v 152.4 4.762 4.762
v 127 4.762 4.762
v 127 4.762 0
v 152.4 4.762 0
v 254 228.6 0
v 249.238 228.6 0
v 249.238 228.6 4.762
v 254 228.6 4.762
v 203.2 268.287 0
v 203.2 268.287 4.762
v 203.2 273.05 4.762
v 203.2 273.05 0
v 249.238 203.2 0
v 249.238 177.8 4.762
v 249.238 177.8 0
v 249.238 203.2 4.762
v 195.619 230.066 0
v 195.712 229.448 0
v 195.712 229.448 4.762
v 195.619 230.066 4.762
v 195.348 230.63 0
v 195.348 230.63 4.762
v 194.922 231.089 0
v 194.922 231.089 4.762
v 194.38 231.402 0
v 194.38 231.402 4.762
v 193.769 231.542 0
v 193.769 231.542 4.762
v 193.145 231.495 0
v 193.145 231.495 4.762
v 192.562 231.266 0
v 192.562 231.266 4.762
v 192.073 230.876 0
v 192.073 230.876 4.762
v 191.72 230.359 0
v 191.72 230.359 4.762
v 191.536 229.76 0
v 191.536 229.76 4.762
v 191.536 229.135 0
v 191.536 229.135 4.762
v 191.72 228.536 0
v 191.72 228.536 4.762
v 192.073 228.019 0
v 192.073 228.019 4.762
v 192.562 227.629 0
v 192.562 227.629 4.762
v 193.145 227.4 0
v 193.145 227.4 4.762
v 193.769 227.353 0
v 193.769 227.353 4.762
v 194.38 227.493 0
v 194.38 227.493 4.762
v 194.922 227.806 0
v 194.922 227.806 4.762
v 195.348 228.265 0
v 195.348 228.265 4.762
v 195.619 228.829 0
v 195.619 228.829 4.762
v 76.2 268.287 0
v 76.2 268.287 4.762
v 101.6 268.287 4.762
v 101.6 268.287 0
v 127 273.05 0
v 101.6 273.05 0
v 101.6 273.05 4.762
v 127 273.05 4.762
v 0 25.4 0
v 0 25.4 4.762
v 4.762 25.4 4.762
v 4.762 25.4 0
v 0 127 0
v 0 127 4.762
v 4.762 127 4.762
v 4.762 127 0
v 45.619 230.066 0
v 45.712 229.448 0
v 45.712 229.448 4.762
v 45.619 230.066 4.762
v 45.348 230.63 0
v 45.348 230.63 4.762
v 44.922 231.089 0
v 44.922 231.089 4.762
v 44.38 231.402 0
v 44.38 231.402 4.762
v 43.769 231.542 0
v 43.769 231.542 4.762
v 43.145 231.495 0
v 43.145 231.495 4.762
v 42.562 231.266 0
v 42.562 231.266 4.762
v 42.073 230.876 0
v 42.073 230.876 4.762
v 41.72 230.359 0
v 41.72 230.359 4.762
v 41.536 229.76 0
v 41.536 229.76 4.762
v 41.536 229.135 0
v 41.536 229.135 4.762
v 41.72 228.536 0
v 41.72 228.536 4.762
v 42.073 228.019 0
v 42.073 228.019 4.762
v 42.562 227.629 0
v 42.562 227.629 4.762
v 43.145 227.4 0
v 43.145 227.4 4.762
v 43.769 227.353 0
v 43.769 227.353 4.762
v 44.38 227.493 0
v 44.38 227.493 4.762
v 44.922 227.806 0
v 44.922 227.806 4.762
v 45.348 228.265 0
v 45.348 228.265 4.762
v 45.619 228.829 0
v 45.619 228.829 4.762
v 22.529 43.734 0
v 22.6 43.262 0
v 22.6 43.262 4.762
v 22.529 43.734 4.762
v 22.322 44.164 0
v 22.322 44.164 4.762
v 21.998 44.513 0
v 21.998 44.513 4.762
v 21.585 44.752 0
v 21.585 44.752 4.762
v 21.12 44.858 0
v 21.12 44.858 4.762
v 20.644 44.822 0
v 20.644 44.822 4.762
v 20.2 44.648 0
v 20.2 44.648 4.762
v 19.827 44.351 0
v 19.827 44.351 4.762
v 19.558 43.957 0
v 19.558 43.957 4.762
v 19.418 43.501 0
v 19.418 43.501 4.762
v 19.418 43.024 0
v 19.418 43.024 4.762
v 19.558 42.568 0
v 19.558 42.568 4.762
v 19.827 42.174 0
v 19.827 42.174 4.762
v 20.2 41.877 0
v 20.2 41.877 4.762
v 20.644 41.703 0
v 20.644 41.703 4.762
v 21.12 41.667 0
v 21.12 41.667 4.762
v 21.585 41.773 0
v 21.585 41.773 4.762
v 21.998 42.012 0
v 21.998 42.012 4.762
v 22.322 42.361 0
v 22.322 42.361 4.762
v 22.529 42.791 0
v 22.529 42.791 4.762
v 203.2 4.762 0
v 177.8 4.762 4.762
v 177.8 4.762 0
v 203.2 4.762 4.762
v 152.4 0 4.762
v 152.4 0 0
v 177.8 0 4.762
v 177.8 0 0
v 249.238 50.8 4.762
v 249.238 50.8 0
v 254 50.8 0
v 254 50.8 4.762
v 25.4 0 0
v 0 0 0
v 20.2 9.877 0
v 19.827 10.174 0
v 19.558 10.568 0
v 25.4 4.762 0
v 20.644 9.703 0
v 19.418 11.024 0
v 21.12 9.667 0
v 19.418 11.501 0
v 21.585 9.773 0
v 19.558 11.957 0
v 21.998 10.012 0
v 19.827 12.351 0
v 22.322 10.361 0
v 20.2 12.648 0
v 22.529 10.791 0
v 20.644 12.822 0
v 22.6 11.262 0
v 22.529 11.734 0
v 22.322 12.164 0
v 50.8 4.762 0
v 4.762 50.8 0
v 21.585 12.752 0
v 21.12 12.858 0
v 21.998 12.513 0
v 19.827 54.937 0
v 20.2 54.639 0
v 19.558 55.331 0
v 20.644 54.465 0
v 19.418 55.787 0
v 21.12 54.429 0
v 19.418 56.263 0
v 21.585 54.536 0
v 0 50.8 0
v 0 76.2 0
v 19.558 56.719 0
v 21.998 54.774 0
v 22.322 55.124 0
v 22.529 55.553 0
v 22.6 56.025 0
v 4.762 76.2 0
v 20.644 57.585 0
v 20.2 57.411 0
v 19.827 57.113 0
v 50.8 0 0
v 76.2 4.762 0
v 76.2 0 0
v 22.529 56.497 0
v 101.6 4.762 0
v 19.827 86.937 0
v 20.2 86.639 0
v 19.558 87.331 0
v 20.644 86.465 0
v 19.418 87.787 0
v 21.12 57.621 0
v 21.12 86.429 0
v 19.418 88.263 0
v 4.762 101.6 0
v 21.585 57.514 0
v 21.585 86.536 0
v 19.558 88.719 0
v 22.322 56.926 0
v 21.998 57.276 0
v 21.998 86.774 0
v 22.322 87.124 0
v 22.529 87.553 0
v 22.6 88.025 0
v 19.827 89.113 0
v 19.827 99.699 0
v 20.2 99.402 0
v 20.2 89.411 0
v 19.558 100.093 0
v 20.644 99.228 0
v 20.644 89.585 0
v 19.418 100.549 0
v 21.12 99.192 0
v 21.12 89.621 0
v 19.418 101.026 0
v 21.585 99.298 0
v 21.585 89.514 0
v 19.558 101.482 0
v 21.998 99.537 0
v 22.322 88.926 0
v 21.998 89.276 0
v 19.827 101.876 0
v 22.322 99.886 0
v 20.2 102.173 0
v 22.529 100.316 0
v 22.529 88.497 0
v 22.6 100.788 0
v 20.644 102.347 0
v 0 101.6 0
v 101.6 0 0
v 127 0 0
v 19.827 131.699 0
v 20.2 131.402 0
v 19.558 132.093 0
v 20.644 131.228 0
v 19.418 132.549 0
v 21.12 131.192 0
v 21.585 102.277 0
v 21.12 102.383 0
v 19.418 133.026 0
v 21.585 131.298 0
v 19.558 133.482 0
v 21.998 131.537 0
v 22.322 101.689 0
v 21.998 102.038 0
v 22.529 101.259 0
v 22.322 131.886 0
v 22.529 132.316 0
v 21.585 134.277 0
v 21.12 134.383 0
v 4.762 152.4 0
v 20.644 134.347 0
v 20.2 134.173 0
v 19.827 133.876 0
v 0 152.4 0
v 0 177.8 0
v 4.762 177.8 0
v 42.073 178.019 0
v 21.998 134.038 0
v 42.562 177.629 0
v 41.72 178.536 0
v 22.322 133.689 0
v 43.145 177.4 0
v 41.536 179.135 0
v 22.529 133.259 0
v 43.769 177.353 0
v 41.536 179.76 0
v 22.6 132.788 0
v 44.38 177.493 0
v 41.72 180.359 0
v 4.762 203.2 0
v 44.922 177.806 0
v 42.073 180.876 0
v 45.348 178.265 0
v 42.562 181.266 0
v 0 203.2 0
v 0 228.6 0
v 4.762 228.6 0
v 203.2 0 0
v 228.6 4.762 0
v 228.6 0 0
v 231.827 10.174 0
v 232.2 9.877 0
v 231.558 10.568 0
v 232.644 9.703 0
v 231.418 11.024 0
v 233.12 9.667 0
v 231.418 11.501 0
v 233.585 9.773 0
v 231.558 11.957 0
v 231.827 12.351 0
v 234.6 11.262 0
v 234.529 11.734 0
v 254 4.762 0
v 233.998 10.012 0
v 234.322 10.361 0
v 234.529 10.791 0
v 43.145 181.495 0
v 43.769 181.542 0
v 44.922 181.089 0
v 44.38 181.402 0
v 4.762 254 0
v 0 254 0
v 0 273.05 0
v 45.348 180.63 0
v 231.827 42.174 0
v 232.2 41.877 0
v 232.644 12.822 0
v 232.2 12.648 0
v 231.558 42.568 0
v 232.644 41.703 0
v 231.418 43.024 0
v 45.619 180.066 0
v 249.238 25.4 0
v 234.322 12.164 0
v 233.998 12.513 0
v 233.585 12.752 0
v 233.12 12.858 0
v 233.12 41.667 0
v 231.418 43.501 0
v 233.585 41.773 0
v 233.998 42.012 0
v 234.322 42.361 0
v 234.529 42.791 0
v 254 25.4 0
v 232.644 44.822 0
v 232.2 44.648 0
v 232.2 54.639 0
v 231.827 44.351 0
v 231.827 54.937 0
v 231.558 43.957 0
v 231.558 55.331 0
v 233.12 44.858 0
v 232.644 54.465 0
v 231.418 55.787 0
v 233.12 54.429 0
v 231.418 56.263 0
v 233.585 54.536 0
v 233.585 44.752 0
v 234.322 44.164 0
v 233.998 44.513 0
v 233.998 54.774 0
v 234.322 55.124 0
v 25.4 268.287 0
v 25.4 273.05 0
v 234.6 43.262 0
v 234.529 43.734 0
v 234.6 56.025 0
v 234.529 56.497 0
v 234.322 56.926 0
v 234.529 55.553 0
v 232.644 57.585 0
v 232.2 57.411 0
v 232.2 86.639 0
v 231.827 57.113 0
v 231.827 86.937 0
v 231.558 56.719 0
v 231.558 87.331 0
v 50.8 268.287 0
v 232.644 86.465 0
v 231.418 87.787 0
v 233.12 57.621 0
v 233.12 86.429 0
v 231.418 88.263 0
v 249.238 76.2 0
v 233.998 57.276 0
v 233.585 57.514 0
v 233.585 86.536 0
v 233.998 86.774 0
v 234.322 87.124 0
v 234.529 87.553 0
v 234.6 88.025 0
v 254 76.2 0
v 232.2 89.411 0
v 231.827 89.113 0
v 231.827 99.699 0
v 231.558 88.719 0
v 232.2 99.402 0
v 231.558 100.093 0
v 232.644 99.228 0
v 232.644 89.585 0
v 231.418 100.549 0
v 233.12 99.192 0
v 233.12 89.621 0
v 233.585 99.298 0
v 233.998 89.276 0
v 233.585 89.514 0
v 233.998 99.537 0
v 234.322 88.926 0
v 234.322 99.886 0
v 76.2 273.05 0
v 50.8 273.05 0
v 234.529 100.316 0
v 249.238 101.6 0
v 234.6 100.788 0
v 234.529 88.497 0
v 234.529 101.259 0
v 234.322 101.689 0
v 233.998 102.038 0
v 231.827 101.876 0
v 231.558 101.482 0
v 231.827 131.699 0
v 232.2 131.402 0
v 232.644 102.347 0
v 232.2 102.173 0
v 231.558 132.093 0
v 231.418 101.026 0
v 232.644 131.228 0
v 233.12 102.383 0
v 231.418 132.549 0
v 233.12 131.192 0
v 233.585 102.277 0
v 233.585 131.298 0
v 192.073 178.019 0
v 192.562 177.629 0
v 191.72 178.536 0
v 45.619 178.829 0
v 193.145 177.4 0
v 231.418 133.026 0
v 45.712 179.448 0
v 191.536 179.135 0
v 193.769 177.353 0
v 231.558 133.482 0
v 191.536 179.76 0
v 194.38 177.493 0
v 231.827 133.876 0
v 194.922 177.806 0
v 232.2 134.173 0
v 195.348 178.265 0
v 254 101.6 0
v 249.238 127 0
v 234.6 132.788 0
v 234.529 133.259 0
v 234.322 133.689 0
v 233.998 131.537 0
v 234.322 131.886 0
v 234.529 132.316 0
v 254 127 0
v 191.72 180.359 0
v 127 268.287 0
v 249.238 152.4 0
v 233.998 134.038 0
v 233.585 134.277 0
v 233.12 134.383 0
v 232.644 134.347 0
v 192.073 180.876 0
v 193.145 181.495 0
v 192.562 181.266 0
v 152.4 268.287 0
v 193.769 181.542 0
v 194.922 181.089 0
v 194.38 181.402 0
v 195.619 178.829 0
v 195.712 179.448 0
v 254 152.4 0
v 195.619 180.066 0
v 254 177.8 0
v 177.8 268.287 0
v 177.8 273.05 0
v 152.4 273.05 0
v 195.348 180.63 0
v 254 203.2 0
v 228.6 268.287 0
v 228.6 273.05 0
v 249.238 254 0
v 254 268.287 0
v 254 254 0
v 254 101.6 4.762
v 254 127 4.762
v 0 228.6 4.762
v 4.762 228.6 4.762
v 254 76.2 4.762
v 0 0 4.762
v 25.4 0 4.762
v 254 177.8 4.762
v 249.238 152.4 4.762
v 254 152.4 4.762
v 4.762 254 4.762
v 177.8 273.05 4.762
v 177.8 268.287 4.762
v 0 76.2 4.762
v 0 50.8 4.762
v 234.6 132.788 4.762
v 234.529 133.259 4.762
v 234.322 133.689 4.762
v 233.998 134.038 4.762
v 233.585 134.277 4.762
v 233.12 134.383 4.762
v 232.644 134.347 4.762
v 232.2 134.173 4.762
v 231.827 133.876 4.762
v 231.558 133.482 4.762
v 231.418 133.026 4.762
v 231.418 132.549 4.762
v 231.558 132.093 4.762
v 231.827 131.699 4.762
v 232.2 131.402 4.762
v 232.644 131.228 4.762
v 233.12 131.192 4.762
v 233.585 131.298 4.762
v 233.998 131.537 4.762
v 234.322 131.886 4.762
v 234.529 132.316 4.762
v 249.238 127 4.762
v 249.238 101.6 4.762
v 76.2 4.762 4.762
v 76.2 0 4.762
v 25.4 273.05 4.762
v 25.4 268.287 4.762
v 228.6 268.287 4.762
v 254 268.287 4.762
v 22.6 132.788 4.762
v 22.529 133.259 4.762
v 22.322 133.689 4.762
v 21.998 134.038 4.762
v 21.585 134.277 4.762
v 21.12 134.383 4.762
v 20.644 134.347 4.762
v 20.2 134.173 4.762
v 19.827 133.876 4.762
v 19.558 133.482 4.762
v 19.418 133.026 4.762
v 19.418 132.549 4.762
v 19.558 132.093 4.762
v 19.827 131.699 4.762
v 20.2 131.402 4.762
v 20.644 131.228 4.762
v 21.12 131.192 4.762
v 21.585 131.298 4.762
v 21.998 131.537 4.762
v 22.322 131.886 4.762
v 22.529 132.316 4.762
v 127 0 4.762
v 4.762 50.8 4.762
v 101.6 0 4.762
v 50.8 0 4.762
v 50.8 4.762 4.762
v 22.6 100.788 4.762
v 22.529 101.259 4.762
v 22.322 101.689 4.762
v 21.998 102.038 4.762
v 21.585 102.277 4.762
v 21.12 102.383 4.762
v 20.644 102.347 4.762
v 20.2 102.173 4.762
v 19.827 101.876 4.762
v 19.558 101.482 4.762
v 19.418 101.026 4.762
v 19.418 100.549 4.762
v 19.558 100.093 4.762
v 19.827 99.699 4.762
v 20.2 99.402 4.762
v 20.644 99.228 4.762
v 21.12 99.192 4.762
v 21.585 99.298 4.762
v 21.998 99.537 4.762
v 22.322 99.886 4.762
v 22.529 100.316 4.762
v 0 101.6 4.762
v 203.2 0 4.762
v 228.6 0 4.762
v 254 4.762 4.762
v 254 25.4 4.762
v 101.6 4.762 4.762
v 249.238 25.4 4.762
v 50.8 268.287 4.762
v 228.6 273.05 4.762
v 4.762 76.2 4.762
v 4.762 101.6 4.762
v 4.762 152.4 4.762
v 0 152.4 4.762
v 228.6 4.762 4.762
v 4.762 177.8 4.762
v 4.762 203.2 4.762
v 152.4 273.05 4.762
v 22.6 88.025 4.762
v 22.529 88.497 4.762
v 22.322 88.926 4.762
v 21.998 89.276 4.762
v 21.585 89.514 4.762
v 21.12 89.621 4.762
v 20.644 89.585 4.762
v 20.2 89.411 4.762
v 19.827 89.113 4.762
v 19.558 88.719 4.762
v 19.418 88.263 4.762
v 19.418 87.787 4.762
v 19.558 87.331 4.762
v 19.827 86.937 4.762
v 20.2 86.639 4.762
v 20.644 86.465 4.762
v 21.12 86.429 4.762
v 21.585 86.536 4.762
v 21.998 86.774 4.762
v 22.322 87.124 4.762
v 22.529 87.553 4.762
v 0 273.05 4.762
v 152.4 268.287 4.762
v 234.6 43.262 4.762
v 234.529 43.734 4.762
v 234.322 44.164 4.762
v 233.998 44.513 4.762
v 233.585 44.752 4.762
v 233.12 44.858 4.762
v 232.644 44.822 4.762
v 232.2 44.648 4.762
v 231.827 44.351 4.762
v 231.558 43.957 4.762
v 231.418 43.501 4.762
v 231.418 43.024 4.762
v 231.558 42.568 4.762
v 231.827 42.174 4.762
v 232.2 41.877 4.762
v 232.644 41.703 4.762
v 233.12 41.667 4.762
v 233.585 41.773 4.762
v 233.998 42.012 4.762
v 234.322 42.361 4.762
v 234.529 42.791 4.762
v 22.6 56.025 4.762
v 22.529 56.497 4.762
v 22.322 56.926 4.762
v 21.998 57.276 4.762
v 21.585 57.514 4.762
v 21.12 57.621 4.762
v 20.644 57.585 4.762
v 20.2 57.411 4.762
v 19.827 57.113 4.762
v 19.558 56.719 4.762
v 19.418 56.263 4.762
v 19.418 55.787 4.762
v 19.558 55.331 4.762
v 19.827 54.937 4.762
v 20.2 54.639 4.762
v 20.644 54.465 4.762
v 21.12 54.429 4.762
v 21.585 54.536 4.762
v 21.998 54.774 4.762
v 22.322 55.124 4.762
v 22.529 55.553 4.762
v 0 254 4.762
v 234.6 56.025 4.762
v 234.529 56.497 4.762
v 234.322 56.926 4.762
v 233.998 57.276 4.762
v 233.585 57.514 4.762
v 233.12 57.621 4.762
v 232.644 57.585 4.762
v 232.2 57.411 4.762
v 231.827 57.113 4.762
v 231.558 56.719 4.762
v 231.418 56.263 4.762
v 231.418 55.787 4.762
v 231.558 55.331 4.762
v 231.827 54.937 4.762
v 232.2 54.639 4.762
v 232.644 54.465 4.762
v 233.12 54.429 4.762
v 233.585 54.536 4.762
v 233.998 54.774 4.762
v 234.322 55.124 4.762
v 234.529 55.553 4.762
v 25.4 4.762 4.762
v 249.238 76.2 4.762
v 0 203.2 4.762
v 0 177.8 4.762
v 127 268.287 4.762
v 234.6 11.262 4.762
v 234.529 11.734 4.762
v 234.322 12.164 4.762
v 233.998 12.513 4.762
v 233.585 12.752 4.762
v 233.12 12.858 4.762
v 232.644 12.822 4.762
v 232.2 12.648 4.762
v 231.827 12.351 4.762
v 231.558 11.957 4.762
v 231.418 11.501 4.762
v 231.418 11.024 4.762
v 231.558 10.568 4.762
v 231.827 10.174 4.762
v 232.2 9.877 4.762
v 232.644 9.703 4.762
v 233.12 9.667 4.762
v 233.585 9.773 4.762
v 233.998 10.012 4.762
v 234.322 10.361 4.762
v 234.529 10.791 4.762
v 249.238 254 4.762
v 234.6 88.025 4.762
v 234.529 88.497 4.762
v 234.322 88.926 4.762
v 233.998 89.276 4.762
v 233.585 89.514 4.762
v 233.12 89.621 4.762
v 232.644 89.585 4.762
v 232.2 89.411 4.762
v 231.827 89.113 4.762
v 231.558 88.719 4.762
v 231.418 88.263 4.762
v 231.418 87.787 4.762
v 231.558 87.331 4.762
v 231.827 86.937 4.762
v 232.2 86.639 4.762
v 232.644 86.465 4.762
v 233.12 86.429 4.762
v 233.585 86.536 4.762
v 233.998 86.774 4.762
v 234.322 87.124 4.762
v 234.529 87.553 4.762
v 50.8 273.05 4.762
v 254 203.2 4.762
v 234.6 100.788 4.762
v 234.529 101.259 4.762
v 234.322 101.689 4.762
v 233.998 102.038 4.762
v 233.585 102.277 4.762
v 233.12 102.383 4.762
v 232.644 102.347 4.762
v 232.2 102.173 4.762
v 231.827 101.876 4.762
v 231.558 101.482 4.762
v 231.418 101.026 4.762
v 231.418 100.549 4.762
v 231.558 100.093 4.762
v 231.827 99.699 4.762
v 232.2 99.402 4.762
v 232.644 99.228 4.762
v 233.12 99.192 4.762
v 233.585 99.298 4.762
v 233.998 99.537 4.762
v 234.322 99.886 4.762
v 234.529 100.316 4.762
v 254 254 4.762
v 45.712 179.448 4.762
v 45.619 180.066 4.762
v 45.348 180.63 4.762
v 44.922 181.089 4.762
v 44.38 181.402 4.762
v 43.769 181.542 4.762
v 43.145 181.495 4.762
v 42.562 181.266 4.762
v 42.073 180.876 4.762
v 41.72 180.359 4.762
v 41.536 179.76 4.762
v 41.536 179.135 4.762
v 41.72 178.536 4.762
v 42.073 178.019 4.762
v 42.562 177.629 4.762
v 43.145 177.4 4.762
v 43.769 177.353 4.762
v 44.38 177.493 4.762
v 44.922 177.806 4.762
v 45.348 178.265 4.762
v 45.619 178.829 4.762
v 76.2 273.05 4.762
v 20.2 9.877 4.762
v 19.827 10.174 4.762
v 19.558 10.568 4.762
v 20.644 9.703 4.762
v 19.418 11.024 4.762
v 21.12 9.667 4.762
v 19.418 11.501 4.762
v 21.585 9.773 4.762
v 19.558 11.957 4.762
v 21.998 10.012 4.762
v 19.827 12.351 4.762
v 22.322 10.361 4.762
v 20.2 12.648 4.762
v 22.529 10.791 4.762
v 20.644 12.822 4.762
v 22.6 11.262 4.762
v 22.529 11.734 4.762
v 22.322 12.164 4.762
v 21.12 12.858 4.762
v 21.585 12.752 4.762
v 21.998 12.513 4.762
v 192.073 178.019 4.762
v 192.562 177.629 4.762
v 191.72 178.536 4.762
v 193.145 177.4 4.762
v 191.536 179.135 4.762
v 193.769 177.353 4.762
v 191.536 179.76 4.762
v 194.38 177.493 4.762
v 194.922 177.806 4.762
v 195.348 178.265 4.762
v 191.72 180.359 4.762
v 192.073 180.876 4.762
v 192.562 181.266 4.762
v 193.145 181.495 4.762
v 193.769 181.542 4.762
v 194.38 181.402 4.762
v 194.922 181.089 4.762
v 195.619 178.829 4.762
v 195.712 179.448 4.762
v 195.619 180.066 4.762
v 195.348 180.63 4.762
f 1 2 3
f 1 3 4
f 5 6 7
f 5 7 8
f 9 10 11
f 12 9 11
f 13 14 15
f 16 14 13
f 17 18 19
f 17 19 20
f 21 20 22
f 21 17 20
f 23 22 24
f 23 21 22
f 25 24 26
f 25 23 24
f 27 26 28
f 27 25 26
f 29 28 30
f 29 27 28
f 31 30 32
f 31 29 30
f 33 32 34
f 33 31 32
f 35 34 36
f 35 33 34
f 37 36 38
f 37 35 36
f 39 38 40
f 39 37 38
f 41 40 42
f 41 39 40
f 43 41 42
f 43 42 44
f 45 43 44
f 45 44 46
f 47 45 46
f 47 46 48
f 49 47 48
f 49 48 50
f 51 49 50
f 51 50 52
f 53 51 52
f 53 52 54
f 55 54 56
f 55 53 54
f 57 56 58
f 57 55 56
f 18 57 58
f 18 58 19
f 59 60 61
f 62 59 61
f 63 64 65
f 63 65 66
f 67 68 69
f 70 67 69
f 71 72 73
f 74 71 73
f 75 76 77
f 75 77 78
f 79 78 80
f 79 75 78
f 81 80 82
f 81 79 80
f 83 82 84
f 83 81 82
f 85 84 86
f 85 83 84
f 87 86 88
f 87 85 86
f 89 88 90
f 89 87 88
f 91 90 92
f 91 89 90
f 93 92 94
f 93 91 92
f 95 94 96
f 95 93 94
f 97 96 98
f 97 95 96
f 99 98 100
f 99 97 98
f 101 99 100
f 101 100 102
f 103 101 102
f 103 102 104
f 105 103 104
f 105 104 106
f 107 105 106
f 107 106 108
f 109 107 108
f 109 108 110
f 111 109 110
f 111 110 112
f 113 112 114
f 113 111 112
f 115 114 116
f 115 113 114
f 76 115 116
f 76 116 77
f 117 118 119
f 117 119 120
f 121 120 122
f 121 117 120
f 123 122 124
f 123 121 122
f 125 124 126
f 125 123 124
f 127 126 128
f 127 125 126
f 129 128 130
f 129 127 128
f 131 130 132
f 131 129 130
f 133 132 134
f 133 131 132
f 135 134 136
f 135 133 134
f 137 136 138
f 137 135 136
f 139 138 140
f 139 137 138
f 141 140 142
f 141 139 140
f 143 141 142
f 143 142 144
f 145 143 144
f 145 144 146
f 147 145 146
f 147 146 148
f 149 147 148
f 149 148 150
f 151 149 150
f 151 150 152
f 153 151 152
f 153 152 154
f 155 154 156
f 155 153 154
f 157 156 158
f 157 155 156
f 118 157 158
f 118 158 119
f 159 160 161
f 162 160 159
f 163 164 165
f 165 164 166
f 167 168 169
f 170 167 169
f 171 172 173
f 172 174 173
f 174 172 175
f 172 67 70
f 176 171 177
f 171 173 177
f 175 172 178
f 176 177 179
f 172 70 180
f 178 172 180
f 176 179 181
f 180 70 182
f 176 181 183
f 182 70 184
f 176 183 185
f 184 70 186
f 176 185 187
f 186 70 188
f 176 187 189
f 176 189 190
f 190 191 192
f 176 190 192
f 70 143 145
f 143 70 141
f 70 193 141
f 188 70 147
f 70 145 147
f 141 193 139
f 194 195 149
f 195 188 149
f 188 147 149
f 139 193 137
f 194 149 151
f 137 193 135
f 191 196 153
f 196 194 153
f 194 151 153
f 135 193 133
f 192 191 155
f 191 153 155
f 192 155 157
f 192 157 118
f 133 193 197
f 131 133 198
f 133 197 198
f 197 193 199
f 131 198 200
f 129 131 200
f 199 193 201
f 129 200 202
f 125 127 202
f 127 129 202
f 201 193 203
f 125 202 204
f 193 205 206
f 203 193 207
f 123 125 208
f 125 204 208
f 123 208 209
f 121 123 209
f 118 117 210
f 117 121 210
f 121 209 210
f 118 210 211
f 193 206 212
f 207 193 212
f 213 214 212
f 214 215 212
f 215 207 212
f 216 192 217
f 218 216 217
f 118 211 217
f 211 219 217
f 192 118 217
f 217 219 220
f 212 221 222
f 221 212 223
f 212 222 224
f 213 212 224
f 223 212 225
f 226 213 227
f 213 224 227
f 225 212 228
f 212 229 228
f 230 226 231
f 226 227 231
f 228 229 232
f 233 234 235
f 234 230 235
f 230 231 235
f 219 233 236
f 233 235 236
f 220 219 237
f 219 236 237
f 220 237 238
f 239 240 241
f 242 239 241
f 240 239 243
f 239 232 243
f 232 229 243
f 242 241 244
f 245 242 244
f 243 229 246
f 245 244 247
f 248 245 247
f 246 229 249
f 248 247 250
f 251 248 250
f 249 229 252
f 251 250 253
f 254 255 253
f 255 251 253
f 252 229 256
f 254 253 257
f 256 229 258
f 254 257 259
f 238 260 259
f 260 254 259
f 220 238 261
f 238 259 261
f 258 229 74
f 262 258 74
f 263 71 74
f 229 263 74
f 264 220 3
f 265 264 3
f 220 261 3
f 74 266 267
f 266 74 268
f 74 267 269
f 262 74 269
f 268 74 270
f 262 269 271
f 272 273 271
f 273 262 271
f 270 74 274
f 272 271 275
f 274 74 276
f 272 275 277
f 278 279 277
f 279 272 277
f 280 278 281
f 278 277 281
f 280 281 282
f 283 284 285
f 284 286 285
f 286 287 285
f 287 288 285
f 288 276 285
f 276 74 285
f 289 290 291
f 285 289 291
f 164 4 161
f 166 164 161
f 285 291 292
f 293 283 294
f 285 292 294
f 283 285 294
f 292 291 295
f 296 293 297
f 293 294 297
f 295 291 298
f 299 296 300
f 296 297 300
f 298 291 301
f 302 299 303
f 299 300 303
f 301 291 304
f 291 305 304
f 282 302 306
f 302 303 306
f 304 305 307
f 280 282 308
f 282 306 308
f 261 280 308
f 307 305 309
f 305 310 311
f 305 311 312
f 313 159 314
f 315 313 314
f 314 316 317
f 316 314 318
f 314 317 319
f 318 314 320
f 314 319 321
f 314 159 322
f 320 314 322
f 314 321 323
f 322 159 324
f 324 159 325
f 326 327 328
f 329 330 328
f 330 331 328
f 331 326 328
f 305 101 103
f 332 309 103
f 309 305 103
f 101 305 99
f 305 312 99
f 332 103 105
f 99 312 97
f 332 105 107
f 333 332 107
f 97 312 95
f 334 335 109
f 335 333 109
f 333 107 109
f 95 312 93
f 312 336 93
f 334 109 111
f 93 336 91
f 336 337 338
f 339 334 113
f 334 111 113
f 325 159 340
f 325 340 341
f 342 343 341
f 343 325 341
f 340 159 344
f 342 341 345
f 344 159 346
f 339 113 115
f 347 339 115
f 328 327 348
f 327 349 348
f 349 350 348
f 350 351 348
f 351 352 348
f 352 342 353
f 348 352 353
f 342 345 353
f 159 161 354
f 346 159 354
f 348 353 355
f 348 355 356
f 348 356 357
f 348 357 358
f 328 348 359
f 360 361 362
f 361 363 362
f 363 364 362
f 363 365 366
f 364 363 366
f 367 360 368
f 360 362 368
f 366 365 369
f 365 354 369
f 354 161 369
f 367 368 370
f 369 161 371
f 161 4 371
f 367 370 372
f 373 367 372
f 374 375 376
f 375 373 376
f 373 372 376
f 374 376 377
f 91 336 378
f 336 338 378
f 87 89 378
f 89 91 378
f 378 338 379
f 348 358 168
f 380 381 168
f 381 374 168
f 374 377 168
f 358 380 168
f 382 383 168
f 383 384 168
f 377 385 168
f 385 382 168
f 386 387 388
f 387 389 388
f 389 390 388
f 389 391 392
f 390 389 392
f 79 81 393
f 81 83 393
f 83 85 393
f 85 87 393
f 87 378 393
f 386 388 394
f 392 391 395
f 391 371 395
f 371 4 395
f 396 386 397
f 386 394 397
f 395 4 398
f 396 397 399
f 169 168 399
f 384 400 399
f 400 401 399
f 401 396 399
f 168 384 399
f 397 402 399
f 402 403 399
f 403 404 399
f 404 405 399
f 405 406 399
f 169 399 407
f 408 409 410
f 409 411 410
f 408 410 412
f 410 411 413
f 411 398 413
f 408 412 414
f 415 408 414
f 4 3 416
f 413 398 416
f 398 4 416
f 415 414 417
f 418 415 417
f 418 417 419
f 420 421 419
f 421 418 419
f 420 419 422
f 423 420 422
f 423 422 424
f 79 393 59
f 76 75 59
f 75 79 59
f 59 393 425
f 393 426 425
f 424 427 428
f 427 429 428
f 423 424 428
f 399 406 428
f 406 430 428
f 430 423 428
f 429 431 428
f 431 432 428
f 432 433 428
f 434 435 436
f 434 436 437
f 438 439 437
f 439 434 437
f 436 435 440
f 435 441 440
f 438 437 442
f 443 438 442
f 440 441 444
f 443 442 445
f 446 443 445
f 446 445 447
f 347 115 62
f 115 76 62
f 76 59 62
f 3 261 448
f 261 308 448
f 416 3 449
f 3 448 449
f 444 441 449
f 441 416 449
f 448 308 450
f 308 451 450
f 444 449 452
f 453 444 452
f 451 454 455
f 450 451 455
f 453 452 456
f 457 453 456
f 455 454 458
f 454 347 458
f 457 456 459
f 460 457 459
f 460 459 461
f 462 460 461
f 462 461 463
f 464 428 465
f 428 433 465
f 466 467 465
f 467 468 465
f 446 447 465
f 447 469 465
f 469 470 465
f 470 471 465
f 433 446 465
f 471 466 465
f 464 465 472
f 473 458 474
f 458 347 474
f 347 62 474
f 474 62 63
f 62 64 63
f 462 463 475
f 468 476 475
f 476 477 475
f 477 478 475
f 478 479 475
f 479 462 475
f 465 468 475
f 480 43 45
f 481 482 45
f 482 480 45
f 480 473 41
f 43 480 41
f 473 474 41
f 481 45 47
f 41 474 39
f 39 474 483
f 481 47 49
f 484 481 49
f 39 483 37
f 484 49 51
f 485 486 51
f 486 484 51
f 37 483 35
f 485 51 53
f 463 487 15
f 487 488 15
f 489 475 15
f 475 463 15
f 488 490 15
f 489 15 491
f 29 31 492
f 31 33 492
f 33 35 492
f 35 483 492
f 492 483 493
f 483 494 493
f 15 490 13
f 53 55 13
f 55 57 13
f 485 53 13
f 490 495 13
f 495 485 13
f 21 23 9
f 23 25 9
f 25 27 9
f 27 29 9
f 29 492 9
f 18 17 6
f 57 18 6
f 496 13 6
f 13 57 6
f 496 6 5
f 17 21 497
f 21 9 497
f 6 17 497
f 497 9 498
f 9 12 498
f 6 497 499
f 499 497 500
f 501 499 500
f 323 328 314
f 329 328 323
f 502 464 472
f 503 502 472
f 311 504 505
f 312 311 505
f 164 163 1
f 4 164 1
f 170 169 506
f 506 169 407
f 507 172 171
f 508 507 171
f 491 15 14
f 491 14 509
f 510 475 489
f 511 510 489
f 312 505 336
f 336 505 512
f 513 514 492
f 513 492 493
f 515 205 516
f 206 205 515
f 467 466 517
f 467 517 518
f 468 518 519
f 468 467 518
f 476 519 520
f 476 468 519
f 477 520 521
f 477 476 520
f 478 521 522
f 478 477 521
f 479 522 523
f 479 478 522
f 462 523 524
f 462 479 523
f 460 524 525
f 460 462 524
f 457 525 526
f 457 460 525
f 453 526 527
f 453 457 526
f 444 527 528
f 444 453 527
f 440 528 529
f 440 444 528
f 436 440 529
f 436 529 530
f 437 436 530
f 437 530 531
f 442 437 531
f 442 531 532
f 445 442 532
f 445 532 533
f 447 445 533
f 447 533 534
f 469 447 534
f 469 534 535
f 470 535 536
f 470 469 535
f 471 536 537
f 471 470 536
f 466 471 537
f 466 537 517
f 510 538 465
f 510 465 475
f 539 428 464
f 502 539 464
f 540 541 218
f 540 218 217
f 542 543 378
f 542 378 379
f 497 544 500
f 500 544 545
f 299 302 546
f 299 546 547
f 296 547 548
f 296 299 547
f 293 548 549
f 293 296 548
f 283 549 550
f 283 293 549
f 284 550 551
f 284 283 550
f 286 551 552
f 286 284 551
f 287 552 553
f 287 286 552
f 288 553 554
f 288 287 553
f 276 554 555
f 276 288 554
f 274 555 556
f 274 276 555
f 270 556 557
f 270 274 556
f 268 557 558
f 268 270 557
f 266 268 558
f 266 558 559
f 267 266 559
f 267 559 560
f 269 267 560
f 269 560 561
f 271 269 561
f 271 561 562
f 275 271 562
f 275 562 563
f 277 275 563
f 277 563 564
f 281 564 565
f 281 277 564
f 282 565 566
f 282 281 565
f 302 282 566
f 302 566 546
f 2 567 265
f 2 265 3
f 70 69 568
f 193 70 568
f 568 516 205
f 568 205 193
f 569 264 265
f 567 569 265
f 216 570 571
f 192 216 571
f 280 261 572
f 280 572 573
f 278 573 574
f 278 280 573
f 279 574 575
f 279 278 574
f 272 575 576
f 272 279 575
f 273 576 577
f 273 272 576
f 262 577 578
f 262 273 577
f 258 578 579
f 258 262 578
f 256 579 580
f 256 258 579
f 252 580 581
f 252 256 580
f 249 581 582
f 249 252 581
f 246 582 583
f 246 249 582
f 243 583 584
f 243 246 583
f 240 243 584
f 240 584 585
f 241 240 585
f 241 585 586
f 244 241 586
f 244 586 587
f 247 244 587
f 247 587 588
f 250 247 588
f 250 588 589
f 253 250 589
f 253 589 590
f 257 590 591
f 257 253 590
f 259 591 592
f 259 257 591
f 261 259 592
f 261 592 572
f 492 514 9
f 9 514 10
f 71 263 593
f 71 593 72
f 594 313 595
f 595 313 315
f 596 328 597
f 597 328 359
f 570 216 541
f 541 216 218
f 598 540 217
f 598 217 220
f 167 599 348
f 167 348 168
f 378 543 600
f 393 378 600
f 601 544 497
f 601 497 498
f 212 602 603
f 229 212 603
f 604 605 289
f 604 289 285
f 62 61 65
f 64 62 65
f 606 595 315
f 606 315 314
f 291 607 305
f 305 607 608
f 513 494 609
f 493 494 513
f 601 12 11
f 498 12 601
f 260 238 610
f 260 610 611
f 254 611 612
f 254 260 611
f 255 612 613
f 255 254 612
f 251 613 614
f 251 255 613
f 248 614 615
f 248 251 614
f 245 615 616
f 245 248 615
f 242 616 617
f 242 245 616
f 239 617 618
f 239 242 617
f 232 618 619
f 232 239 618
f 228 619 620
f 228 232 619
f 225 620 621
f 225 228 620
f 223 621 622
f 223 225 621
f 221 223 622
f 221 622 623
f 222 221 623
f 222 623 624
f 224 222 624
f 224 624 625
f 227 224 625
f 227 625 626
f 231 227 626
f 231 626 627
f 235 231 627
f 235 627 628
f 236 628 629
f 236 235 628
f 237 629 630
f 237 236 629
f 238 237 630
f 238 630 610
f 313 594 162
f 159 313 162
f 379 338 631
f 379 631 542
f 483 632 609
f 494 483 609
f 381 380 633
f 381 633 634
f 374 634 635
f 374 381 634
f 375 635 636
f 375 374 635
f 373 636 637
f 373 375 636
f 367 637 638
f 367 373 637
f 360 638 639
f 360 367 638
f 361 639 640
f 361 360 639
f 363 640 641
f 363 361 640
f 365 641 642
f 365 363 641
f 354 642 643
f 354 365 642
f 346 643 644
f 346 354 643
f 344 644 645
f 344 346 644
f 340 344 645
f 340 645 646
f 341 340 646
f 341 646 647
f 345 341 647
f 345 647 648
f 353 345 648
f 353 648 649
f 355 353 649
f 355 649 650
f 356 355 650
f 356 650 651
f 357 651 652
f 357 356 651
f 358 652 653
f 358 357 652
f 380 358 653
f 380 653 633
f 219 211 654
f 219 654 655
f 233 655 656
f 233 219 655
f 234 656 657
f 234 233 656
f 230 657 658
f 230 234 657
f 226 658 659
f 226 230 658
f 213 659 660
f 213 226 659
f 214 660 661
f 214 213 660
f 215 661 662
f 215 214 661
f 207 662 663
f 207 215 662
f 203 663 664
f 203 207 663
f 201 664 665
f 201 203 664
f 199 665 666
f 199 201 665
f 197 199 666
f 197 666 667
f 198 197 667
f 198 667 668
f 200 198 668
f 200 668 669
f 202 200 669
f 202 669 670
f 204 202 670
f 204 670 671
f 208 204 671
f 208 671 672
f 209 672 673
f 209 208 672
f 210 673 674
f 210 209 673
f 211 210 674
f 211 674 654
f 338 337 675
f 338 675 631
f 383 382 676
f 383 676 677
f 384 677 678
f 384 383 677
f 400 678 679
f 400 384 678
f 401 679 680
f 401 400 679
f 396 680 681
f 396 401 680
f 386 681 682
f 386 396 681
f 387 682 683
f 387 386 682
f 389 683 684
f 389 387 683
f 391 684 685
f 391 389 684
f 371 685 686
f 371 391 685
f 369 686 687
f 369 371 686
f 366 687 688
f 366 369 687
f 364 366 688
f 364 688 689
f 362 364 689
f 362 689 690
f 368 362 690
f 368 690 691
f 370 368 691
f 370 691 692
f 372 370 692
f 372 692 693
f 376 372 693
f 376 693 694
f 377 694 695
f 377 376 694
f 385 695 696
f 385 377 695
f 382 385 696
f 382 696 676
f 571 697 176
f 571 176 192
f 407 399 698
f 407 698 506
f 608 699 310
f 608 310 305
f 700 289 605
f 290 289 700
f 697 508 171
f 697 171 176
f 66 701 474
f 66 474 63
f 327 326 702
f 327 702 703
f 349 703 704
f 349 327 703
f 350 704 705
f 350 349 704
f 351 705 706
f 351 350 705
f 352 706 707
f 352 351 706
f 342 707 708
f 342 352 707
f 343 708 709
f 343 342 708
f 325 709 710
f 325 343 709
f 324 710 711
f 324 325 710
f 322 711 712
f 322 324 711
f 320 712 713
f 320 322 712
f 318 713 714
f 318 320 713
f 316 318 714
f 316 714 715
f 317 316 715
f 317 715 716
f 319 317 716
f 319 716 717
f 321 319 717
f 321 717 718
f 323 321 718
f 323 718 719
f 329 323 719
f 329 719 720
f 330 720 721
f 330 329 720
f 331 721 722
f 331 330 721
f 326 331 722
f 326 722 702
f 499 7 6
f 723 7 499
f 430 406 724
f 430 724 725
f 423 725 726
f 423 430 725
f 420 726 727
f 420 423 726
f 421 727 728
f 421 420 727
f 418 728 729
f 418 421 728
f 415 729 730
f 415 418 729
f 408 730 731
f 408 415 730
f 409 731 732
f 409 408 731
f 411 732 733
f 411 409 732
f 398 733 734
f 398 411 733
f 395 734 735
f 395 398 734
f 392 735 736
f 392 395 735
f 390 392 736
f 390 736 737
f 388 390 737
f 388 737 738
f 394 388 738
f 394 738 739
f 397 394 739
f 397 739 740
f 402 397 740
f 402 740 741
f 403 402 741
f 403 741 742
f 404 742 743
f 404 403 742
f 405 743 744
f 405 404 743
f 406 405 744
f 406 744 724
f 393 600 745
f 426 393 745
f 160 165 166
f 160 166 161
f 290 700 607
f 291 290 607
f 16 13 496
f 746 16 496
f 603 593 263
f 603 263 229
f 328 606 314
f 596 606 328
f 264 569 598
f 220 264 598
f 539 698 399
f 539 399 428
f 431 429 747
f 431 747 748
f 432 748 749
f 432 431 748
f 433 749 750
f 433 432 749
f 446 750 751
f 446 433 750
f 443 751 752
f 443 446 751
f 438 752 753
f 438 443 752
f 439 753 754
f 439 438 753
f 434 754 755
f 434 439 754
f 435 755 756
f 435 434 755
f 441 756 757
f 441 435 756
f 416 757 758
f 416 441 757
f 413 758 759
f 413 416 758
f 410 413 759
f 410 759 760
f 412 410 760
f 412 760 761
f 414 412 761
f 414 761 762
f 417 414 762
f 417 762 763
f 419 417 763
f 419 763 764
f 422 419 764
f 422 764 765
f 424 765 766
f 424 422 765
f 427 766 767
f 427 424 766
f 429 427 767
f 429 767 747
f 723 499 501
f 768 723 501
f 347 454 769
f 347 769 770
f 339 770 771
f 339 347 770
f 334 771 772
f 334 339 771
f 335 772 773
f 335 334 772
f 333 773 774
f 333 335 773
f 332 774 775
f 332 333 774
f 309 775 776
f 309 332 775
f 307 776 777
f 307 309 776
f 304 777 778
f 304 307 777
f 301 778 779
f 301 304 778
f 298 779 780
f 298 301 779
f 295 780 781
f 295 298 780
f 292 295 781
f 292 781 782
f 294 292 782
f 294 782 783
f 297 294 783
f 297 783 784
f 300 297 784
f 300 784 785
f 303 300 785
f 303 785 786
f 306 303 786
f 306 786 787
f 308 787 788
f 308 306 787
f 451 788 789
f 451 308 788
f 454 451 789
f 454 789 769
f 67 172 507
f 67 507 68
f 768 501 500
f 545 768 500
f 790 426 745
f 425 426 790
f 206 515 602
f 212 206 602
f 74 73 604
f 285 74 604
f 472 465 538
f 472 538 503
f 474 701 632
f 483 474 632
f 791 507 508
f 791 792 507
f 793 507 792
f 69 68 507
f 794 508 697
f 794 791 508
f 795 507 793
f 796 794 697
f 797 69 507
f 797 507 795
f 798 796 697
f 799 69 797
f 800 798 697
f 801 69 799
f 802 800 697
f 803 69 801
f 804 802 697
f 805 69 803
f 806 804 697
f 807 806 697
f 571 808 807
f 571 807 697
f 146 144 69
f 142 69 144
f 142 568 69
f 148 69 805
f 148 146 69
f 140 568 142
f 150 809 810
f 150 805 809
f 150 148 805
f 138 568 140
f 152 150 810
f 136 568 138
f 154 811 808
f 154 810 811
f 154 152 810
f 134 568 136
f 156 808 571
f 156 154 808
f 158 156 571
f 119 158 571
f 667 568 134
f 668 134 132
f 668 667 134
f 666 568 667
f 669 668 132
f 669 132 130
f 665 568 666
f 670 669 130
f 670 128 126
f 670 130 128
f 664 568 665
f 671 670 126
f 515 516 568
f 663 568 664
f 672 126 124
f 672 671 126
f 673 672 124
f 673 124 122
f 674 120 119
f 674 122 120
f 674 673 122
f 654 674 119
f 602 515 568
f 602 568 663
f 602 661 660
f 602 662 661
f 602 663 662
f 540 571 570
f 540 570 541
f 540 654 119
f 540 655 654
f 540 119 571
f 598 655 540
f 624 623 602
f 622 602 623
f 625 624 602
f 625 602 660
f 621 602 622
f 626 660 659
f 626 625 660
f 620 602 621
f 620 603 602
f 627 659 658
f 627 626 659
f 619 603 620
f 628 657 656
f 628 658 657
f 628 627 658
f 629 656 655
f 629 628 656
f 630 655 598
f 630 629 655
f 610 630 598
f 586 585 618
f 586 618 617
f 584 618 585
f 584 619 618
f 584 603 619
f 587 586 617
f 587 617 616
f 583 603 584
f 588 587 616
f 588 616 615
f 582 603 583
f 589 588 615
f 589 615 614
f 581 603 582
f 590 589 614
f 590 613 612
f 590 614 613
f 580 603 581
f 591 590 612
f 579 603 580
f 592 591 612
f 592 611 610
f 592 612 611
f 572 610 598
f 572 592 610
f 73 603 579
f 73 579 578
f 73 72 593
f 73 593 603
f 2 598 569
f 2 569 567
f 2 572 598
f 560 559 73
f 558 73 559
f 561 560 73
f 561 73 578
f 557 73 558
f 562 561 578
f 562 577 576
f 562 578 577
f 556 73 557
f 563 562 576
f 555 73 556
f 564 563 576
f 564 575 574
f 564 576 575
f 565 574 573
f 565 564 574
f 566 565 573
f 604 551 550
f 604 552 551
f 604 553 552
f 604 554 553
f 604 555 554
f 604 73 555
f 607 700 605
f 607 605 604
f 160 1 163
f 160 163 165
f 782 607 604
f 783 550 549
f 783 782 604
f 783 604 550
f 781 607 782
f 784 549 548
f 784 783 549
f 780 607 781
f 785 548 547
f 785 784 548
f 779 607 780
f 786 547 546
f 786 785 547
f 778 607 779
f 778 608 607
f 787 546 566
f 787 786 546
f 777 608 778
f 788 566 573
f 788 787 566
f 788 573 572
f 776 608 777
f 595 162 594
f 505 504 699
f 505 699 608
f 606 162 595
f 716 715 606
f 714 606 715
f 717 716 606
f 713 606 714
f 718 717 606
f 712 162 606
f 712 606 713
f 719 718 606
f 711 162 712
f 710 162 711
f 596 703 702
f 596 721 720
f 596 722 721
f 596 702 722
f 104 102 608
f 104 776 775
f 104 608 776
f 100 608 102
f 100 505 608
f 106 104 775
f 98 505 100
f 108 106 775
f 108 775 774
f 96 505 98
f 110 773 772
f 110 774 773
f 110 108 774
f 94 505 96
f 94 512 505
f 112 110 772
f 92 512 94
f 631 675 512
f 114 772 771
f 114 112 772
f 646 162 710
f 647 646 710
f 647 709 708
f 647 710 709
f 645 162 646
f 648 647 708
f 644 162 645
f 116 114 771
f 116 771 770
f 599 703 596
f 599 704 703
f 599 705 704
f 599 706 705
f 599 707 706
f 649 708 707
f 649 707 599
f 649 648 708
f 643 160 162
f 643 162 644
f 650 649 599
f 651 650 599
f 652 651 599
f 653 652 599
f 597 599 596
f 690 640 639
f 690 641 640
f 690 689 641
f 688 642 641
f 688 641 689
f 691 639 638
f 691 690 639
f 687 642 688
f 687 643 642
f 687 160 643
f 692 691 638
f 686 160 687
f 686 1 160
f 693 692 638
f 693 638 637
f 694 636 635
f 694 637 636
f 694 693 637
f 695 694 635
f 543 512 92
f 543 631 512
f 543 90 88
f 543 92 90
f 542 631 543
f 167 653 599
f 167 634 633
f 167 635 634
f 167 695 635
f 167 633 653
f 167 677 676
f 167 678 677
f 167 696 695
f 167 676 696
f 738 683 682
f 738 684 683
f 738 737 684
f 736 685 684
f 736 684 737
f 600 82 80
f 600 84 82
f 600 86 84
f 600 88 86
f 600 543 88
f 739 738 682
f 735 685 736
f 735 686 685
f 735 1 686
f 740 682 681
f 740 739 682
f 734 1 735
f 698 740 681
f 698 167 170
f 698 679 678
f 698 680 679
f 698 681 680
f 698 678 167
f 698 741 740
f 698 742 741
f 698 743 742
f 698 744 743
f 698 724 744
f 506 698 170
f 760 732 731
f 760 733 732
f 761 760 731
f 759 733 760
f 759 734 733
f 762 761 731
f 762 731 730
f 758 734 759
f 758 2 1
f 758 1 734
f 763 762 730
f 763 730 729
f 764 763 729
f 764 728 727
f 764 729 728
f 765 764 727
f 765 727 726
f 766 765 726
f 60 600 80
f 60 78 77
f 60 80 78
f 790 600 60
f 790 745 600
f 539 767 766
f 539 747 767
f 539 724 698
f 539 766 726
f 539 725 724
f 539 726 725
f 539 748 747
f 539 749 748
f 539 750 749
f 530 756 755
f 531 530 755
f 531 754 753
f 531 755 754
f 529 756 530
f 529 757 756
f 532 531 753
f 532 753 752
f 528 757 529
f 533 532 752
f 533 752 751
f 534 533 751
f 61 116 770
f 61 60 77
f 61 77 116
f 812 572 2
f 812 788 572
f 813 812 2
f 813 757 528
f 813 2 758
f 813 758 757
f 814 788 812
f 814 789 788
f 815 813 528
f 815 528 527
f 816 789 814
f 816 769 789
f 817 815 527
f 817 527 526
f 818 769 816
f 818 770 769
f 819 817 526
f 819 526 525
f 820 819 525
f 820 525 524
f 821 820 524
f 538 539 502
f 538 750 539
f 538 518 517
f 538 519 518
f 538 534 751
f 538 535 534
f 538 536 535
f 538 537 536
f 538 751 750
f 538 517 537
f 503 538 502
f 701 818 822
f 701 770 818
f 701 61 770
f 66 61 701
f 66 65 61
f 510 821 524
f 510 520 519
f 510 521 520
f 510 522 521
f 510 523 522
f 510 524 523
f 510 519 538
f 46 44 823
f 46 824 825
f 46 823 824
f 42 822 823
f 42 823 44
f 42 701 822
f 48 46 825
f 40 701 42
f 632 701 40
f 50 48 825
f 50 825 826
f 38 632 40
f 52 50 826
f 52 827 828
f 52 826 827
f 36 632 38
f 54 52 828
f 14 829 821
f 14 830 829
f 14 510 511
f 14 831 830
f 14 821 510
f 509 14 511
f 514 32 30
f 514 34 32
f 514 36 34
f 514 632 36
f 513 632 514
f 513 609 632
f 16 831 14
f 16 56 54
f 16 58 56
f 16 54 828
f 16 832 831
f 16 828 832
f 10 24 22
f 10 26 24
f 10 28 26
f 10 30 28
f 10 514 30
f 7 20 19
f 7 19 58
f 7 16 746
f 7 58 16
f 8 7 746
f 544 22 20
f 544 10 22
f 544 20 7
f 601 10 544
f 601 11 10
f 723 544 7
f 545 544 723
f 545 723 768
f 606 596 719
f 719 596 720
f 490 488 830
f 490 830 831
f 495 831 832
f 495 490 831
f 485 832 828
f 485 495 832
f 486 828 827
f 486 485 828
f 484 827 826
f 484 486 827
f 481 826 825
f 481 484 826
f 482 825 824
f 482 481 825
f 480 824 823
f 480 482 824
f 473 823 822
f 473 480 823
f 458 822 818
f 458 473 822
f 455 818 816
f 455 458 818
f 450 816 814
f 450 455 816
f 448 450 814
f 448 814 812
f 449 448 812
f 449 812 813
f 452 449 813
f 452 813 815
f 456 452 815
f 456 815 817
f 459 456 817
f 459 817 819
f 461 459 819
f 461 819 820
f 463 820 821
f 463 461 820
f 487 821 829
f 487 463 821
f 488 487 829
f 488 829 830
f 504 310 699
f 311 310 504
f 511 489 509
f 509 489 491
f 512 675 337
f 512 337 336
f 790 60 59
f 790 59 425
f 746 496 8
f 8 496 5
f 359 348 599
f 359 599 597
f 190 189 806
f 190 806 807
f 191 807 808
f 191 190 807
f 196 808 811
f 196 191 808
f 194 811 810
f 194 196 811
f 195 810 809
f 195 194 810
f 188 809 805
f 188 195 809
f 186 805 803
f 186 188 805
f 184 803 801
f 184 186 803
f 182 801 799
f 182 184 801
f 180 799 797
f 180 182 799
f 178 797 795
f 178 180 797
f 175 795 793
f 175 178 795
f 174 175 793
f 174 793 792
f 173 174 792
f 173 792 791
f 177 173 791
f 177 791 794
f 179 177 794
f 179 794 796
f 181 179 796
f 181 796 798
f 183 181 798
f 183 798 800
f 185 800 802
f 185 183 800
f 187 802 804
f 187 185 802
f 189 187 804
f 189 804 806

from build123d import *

# Parameters (mm, degrees)
F0_W     = 254
F0_H     = 273.05
F0_R     = 1.6
F0_R_2   = 2.1
F1_DEPTH = 4.7625
F2_W     = 25.4
F2_H     = 4.7625
F2_W_2   = 4.7625
F2_H_2   = 25.4
F3_DEPTH = 25.4


with BuildPart() as f1:
    # F0 (on Top) → F1 (new body)
    with BuildSketch(Plane.XY):
        with Locations((127, 136.525)):
            Rectangle(F0_W, F0_H)
        with Locations((21, 11.2625)):
            Circle(F0_R, mode=Mode.SUBTRACT)
        with Locations((21, 43.2625)):
            Circle(F0_R, mode=Mode.SUBTRACT)
        with Locations((21, 56.025)):
            Circle(F0_R, mode=Mode.SUBTRACT)
        with Locations((21, 88.025)):
            Circle(F0_R, mode=Mode.SUBTRACT)
        with Locations((21, 100.7875)):
            Circle(F0_R, mode=Mode.SUBTRACT)
        with Locations((21, 132.7875)):
            Circle(F0_R, mode=Mode.SUBTRACT)
        with Locations((233, 11.2625)):
            Circle(F0_R, mode=Mode.SUBTRACT)
        with Locations((233, 43.2625)):
            Circle(F0_R, mode=Mode.SUBTRACT)
        with Locations((233, 56.025)):
            Circle(F0_R, mode=Mode.SUBTRACT)
        with Locations((233, 88.025)):
            Circle(F0_R, mode=Mode.SUBTRACT)
        with Locations((233, 100.7875)):
            Circle(F0_R, mode=Mode.SUBTRACT)
        with Locations((233, 132.7875)):
            Circle(F0_R, mode=Mode.SUBTRACT)
        with Locations((43.6125, 179.4475)):
            Circle(F0_R_2, mode=Mode.SUBTRACT)
        with Locations((43.6125, 229.4475)):
            Circle(F0_R_2, mode=Mode.SUBTRACT)
        with Locations((193.6125, 179.4475)):
            Circle(F0_R_2, mode=Mode.SUBTRACT)
        with Locations((193.6125, 229.4475)):
            Circle(F0_R_2, mode=Mode.SUBTRACT)
    extrude(amount=F1_DEPTH)

    # F2 (on face) → F3 (cut)
    with BuildSketch(Plane.XY.offset(4.7625)):
        with Locations((38.1, 2.38125)):
            Rectangle(F2_W, F2_H)
        with Locations((88.9, 2.38125)):
            Rectangle(F2_W, F2_H)
        with Locations((139.7, 2.38125)):
            Rectangle(F2_W, F2_H)
        with Locations((190.5, 2.38125)):
            Rectangle(F2_W, F2_H)
        with Locations((241.3, 2.38125)):
            Rectangle(F2_W, F2_H)
        with Locations((2.38125, 241.3)):
            Rectangle(F2_W_2, F2_H_2)
        with Locations((2.38125, 190.5)):
            Rectangle(F2_W_2, F2_H_2)
        with Locations((2.38125, 139.7)):
            Rectangle(F2_W_2, F2_H_2)
        with Locations((2.38125, 88.9)):
            Rectangle(F2_W_2, F2_H_2)
        with Locations((2.38125, 38.1)):
            Rectangle(F2_W_2, F2_H_2)
        with Locations((251.61875, 241.3)):
            Rectangle(F2_W_2, F2_H_2)
        with Locations((251.61875, 190.5)):
            Rectangle(F2_W_2, F2_H_2)
        with Locations((251.61875, 139.7)):
            Rectangle(F2_W_2, F2_H_2)
        with Locations((251.61875, 88.9)):
            Rectangle(F2_W_2, F2_H_2)
        with Locations((251.61875, 38.1)):
            Rectangle(F2_W_2, F2_H_2)
        with Locations((38.1, 270.66875)):
            Rectangle(F2_W, F2_H)
        with Locations((88.9, 270.66875)):
            Rectangle(F2_W, F2_H)
        with Locations((139.7, 270.66875)):
            Rectangle(F2_W, F2_H)
        with Locations((190.5, 270.66875)):
            Rectangle(F2_W, F2_H)
        with Locations((241.3, 270.66875)):
            Rectangle(F2_W, F2_H)
    extrude(amount=-F3_DEPTH, mode=Mode.SUBTRACT)


solid = f1.part
